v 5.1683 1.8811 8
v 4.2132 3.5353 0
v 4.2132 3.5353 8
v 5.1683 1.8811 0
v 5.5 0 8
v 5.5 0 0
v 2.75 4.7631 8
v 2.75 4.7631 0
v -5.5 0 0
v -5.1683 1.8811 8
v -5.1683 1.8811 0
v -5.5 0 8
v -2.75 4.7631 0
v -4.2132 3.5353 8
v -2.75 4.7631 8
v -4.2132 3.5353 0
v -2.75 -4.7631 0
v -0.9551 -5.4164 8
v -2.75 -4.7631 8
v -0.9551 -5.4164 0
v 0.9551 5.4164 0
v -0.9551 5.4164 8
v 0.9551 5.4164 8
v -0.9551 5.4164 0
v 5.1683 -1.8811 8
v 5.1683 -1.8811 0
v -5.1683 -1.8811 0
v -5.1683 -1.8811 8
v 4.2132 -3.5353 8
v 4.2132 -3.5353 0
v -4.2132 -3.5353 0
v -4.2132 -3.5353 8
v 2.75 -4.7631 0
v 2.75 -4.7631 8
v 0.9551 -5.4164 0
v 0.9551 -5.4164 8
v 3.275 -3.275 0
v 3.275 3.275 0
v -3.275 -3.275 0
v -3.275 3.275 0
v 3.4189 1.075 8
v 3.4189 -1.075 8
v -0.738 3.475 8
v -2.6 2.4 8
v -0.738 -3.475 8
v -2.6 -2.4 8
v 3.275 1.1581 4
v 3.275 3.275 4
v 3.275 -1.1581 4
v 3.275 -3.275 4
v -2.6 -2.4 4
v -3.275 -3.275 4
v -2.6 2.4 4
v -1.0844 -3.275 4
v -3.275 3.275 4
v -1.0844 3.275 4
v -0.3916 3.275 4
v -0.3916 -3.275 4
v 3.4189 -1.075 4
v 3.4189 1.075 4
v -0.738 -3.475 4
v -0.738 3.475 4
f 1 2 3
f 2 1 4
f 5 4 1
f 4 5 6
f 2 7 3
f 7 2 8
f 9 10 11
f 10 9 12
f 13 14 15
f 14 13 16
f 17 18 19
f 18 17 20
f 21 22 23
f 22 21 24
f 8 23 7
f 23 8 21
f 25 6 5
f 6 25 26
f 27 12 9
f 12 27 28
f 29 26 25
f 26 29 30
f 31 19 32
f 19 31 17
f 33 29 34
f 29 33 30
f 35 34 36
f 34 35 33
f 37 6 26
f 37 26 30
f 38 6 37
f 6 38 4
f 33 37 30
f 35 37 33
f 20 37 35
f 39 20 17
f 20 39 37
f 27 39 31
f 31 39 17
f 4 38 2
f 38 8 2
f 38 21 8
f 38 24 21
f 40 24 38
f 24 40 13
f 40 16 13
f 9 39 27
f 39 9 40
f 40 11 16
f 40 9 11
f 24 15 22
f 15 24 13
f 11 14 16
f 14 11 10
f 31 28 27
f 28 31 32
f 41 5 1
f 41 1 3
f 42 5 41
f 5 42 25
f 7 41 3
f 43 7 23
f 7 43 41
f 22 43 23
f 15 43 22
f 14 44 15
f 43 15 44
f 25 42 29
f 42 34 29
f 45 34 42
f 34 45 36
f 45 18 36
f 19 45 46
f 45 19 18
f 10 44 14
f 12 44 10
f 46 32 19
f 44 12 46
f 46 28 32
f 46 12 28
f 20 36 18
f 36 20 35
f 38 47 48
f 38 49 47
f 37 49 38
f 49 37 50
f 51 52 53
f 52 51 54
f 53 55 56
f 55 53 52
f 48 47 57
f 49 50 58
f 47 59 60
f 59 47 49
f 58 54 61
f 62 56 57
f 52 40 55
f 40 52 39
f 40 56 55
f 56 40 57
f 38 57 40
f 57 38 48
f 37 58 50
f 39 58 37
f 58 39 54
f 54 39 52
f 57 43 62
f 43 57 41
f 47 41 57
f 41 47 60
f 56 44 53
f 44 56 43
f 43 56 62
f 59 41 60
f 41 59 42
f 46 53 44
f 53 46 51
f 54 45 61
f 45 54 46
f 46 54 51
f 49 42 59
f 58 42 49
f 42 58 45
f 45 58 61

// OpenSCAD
sq_size = 6.55;
sq_height = 4.0;
tr_side = 9.1;
tr_height = 4;

cy_d = 11;
cy_height = tr_height + sq_height; //8
//translate([0,0,-cy_height]) cylinder(h=cy_height,d1=13,d2=13, center=false);
//translate([0,0,-cy_height]) cube([sq_size,sq_height,sq_size], center=true);


function move(point,d,angle) =[point[0]+(sin(angle)*d), point[1]+(cos(angle)*d)];

tr_main = 4.8;
tr_side_gap = (tr_side-tr_main)/2;
a = move([-tr_side/3.5,-tr_side/2],tr_side_gap,0);
b = move(a,tr_main,0);
c = move(b,tr_side_gap,60);
d = move(c,tr_main, 120);
e = move(d,tr_side_gap,180);
f = move(e,tr_main,240);
  
difference() {
    cylinder(h=cy_height,d1=cy_d,d2=cy_d, center=false);
    translate([0,0,sq_height/2]) cube([sq_size,sq_size,sq_height], center=true);
    translate([0,0,cy_height-tr_height])
        linear_extrude(height=tr_height+1)
            polygon([a,b,c,d,e,f],center=false);
}
